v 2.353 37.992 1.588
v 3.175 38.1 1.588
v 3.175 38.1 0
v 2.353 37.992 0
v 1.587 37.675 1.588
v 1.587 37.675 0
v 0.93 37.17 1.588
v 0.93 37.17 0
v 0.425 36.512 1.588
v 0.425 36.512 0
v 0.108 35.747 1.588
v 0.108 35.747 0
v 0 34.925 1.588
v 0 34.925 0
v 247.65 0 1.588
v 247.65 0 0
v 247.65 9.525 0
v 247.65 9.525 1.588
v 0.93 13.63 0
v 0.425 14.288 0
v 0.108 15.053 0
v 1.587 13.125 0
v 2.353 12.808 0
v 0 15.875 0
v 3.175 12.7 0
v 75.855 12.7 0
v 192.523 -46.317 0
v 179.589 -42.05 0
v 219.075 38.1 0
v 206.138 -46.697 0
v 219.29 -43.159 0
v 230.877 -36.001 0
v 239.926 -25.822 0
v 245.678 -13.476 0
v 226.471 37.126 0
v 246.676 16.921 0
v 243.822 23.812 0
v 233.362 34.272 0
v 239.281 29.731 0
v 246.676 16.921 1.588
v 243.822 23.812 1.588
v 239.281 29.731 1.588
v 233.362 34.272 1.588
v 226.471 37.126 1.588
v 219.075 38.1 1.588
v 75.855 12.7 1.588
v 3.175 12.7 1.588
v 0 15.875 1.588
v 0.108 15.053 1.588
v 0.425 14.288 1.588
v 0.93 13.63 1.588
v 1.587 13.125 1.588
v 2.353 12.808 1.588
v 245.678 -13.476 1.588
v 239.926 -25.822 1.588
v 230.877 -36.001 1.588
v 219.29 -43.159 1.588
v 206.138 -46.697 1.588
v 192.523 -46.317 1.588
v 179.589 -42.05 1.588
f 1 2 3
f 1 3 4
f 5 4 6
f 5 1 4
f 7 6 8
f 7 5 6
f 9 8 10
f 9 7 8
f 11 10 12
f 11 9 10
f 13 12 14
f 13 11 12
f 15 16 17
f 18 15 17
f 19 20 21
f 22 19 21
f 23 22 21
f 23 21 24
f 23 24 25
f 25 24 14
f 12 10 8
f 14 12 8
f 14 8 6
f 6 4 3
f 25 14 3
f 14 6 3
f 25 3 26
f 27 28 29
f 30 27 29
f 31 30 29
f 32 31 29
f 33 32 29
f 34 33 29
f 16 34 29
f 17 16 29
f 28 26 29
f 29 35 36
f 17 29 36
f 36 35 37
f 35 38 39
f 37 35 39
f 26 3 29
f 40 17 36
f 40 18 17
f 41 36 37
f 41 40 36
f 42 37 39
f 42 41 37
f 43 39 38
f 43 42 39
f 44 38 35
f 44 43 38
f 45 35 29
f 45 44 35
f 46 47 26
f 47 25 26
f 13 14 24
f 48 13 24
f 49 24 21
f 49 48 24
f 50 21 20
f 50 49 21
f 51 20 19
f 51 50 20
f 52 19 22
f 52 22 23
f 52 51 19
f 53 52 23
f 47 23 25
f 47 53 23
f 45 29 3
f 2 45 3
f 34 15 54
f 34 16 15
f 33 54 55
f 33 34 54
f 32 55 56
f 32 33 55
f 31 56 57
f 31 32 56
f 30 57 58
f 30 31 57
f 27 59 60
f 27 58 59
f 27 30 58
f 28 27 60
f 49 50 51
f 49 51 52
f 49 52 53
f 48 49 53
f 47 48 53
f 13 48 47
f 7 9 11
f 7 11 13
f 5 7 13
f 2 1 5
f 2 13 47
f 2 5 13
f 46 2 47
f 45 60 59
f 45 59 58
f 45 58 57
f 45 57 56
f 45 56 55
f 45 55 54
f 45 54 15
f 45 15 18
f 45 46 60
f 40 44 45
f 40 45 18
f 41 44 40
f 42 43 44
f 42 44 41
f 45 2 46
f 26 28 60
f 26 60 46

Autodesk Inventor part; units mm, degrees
ref_plane "YZ Plane" through (0, 0, 0) normal (1, 0, 0) x (0, 1, 0)
ref_plane "XZ Plane" through (0, 0, 0) normal (0, 1, 0) x (-1, 0, 0)
ref_plane "XY Plane" through (0, 0, 0) normal (0, 0, 1) x (1, 0, 0)
sketch "Sketch1" plane through (0, 0, 0) normal (0, 0, 1) x (1, 0, 0)
  line L0 (0, 0) -> (247.65, 0)
  line L1 (247.65, 0) -> (247.65, 38.1)
  line L2 (247.65, 38.1) -> (0, 38.1)
  line L3 (0, 38.1) -> (0, 0)
  line L4 (286.1616, 0) -> (255.1962, 0)
  line L5 (255.1962, 0) -> (255.1962, 12.7)
  line L6 (255.1962, 12.7) -> (286.1616, 12.7)
  line L7 (286.1616, 12.7) -> (286.1616, 0)
  line L8 (247.65, 12.7) -> (200.66, 12.7)
  circle A0 centre (200.6294, 0) radius 47.0206
  line L9 (16.2468, 38.1) -> (16.2468, 12.7)
  line L10 (16.2468, 12.7) -> (155.3565, 12.7)
  line L11 (0, 12.7) -> (17.7951, 12.7)
  line L12 (179.5891, -42.0504) -> (75.8552, 12.7)
  dimension "d0" = 247.65
  dimension "d1" = 38.1
  dimension "d2" = 12.7
  dimension "d3" = 30.9654
  dimension "d4" = 46.99
extrude "Extrusion1" add sketch "Sketch1" along normal blind 1.5875 contours L12 L10 A0 L0 | L0 A0 L12 | L3 L2 L9 L11 | A0 L2 L0 | L0 A0 L12 | L10 L9 L2 A0 | A0 L8 L1 | L8 A0 L2 L1
fillet "Fillet1" radius 28.575 1 edges at (247.65, 38.1, 0.7937)
fillet "Fillet2" radius 3.175 1 edges at (0, 38.1, 0.7937)
fillet "Fillet3" radius 3.175 1 edges at (0, 12.7, 0.7937)
properties part number "intake sled v5"
